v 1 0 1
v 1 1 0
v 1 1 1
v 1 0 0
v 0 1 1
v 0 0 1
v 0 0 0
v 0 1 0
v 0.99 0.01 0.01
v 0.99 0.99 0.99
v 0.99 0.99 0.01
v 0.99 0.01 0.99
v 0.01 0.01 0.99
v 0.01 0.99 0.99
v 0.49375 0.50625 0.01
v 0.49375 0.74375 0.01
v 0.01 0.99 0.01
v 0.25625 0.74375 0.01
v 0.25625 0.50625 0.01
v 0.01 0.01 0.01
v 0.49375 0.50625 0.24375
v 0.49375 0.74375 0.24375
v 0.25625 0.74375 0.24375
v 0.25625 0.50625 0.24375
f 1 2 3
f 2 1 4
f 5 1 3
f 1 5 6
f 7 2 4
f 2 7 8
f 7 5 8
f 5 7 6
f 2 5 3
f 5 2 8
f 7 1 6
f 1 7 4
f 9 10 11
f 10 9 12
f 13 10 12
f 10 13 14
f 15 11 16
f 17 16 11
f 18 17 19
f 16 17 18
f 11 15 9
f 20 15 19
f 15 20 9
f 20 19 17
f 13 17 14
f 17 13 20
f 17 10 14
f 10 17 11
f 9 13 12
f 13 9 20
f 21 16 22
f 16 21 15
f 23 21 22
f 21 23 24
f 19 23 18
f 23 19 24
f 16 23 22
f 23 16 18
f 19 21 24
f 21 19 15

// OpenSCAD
translate([0.375, 0.625, 0.125]) color([0.9628933046967749, 0.6198760626942967, 0.5999578261672418]) cube([0.2375, 0.2375, 0.2375], center=true);
color([0.3,0.3,0.3,0.3]) difference() { cube([1,1,1]); translate([0.01,0.01,0.01]) cube([0.98,0.98,0.98]); }
